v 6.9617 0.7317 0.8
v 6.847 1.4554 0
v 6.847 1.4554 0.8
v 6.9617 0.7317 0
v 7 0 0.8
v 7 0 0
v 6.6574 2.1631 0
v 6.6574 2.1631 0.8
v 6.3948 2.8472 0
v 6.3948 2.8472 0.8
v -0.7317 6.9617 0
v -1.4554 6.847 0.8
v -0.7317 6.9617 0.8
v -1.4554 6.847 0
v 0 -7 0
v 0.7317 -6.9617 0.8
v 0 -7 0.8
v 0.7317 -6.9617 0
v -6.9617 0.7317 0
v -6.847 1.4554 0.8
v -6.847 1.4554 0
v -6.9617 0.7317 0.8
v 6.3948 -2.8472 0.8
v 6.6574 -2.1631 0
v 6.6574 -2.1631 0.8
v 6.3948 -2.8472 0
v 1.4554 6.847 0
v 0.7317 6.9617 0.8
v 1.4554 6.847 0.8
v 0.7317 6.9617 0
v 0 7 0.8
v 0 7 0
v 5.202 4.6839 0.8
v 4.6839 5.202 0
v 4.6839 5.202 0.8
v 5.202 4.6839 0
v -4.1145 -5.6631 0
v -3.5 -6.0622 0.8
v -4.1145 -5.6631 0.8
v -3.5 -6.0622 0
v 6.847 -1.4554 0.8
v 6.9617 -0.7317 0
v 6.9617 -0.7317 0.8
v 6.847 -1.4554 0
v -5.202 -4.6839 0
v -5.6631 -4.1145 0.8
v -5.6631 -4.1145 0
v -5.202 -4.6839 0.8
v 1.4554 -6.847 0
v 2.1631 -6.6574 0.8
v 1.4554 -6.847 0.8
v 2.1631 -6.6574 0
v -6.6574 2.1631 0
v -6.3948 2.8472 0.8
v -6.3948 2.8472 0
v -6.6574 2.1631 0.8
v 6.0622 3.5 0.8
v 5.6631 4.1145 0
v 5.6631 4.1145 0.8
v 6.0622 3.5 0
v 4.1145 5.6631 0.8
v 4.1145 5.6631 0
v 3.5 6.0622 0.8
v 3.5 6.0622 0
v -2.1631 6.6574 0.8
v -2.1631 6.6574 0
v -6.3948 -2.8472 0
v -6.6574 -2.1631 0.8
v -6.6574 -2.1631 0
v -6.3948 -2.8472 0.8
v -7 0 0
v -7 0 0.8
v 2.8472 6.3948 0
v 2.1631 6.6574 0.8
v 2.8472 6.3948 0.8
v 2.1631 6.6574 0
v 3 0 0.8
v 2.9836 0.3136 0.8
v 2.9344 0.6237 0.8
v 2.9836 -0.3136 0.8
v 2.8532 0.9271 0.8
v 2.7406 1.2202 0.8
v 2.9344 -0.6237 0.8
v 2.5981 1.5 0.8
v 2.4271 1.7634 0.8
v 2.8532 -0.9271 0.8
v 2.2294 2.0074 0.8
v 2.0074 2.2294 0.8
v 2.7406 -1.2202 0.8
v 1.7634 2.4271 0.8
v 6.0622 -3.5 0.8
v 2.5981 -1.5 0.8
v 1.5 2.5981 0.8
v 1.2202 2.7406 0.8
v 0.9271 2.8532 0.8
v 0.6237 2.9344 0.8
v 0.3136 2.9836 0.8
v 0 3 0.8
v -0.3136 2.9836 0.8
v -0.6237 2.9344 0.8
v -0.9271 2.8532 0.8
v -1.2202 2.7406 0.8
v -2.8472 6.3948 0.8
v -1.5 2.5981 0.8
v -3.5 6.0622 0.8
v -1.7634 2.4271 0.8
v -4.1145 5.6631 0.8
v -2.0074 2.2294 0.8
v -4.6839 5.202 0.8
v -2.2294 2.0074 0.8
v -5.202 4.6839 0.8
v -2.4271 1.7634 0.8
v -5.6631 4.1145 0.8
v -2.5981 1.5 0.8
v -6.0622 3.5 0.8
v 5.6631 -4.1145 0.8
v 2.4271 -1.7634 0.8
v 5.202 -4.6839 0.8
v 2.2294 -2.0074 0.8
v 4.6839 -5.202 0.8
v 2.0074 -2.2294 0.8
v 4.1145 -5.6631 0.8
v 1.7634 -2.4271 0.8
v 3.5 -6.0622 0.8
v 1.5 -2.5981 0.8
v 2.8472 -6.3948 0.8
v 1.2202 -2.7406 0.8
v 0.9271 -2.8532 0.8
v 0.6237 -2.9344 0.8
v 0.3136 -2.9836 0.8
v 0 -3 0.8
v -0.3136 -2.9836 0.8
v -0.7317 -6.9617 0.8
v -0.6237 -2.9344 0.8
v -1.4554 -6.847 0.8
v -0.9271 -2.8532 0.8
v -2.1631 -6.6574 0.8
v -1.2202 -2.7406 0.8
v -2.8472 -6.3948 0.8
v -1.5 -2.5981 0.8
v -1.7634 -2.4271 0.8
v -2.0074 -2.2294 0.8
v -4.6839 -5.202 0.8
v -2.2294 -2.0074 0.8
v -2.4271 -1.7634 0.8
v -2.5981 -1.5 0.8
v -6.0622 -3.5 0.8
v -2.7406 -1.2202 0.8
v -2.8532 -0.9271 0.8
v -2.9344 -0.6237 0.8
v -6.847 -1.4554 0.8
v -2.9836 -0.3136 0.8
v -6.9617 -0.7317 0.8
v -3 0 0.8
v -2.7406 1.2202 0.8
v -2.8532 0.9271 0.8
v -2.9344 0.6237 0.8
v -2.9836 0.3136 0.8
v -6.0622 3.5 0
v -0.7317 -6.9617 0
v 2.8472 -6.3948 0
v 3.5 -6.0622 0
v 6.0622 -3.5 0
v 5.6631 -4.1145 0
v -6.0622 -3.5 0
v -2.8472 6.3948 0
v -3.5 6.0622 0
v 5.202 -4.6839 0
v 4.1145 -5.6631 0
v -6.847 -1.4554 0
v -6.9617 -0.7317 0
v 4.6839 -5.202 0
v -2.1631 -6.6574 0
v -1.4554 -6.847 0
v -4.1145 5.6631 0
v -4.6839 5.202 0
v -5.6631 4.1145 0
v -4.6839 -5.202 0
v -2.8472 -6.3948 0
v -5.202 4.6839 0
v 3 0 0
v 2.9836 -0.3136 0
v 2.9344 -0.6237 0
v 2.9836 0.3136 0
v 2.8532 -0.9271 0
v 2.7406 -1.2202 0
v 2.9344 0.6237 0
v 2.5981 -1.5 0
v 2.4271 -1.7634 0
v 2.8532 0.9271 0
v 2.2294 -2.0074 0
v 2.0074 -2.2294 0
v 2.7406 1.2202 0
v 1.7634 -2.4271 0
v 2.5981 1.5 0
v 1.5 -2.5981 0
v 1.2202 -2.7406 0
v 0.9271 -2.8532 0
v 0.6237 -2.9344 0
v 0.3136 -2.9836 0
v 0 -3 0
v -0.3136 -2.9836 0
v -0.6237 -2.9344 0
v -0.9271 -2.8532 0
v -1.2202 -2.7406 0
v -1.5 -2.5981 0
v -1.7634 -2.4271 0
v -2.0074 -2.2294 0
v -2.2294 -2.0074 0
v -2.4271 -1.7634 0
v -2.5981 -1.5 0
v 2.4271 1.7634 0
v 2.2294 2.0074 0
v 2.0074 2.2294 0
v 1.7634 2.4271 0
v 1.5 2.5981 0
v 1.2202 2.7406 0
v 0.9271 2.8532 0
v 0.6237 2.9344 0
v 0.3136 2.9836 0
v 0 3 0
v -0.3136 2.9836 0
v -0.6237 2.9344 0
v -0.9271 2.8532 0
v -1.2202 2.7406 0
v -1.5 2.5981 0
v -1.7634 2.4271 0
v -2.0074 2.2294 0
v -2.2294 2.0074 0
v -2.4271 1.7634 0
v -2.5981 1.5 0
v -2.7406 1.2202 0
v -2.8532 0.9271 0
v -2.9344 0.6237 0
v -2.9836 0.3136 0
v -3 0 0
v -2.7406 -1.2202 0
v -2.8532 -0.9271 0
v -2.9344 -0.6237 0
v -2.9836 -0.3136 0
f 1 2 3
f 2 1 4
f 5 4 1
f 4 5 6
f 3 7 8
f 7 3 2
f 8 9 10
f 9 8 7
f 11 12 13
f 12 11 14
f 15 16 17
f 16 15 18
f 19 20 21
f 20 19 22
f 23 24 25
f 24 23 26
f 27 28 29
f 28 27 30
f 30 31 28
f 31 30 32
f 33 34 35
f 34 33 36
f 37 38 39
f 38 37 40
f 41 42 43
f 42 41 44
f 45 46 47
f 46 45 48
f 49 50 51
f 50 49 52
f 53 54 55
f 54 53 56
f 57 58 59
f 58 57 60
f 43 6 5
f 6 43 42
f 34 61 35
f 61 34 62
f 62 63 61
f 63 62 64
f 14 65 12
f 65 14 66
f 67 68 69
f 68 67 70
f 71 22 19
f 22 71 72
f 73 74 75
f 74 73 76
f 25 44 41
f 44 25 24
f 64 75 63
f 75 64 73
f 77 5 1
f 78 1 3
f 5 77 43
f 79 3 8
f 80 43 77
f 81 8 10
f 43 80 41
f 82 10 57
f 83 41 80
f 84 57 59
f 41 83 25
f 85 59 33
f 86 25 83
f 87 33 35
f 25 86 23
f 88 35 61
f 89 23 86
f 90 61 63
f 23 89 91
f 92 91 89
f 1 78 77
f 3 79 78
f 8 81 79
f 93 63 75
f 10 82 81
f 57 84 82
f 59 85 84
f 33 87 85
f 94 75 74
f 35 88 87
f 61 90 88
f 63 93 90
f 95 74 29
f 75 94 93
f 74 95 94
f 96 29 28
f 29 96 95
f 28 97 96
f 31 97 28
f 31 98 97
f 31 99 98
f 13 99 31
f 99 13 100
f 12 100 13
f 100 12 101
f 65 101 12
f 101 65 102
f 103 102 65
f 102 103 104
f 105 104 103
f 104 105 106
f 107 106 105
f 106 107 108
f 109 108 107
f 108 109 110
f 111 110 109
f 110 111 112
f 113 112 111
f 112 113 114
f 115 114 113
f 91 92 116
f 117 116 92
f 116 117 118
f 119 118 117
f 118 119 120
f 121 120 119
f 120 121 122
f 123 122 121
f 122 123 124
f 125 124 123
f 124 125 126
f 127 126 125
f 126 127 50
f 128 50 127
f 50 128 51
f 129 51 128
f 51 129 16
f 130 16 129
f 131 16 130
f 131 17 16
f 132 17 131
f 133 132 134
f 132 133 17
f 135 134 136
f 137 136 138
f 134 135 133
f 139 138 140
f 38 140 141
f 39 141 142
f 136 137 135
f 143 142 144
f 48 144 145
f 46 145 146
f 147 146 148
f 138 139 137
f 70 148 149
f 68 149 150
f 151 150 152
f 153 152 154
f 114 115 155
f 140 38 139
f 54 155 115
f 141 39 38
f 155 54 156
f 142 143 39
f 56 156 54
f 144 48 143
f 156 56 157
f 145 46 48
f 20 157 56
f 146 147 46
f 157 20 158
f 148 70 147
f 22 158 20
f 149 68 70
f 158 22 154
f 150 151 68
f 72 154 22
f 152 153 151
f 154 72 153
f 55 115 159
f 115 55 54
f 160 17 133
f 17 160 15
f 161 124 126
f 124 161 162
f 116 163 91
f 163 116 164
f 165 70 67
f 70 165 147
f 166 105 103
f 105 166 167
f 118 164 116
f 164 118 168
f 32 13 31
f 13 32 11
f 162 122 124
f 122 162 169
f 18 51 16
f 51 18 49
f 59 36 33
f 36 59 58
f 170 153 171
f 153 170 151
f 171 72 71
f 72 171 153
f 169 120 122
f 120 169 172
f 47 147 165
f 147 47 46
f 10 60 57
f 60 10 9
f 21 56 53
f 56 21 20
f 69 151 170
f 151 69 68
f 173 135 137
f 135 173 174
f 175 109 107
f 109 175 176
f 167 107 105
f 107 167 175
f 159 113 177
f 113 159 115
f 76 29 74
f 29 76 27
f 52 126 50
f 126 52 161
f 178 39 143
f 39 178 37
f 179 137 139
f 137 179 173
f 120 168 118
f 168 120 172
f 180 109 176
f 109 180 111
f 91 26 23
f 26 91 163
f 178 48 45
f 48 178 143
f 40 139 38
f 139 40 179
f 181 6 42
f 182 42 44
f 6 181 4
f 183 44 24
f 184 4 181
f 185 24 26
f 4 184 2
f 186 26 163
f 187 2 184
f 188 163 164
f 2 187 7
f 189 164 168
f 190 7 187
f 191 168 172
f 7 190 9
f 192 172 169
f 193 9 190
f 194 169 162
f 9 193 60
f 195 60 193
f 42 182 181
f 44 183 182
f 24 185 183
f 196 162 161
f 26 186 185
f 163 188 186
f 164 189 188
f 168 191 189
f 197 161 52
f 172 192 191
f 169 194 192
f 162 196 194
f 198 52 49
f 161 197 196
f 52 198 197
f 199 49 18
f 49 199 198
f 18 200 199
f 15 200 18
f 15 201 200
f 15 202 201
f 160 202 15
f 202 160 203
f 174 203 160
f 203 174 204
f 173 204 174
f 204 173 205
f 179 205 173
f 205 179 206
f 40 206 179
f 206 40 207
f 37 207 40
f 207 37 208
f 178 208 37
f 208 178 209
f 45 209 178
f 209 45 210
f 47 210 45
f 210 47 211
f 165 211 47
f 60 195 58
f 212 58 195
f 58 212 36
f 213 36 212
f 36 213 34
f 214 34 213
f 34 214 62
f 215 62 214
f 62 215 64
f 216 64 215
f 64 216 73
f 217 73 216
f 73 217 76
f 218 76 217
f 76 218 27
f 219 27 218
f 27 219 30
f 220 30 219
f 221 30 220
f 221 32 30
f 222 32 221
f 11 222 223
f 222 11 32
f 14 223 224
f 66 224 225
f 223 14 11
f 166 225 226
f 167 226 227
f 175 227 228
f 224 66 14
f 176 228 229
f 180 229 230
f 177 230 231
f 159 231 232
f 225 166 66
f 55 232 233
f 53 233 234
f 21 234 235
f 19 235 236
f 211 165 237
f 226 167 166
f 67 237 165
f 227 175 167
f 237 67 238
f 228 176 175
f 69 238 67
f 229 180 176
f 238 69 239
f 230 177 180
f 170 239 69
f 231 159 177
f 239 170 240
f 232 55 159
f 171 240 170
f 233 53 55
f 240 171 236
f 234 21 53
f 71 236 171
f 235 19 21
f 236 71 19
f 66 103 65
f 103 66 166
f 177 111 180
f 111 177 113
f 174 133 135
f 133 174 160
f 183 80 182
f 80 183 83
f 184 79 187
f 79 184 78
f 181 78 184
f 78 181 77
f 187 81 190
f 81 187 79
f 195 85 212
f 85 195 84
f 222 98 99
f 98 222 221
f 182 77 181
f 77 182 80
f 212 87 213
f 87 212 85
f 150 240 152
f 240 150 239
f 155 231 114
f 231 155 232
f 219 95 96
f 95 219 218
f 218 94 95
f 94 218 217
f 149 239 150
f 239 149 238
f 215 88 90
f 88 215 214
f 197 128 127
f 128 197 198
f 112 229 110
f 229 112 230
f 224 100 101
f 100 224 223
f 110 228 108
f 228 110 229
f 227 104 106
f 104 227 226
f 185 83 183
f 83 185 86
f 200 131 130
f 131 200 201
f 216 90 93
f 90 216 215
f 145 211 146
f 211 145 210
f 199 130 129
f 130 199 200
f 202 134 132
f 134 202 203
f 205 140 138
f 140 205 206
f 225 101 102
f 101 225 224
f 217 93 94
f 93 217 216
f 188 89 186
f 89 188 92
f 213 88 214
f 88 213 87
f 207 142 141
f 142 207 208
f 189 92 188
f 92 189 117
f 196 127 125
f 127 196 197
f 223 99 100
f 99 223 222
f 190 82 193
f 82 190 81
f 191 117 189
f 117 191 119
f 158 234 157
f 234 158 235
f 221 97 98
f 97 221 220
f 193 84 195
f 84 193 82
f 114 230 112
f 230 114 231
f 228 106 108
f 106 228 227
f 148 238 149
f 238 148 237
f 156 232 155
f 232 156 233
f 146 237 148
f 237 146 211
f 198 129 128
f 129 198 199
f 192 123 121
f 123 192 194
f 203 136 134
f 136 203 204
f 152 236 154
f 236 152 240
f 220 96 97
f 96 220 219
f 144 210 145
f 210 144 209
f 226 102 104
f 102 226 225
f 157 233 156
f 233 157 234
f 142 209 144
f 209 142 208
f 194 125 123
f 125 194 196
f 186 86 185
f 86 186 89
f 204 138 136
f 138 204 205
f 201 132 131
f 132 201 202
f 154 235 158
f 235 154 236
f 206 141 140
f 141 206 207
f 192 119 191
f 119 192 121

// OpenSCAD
// Precision shim ring.
$fn = 60;
eps = 0.02;
inner_d = 6;
outer_d = 14;
thickness = 0.8;
difference() {
    cylinder(d = outer_d, h = thickness);
    translate([0, 0, -eps]) cylinder(d = inner_d, h = thickness + 2 * eps);
}
